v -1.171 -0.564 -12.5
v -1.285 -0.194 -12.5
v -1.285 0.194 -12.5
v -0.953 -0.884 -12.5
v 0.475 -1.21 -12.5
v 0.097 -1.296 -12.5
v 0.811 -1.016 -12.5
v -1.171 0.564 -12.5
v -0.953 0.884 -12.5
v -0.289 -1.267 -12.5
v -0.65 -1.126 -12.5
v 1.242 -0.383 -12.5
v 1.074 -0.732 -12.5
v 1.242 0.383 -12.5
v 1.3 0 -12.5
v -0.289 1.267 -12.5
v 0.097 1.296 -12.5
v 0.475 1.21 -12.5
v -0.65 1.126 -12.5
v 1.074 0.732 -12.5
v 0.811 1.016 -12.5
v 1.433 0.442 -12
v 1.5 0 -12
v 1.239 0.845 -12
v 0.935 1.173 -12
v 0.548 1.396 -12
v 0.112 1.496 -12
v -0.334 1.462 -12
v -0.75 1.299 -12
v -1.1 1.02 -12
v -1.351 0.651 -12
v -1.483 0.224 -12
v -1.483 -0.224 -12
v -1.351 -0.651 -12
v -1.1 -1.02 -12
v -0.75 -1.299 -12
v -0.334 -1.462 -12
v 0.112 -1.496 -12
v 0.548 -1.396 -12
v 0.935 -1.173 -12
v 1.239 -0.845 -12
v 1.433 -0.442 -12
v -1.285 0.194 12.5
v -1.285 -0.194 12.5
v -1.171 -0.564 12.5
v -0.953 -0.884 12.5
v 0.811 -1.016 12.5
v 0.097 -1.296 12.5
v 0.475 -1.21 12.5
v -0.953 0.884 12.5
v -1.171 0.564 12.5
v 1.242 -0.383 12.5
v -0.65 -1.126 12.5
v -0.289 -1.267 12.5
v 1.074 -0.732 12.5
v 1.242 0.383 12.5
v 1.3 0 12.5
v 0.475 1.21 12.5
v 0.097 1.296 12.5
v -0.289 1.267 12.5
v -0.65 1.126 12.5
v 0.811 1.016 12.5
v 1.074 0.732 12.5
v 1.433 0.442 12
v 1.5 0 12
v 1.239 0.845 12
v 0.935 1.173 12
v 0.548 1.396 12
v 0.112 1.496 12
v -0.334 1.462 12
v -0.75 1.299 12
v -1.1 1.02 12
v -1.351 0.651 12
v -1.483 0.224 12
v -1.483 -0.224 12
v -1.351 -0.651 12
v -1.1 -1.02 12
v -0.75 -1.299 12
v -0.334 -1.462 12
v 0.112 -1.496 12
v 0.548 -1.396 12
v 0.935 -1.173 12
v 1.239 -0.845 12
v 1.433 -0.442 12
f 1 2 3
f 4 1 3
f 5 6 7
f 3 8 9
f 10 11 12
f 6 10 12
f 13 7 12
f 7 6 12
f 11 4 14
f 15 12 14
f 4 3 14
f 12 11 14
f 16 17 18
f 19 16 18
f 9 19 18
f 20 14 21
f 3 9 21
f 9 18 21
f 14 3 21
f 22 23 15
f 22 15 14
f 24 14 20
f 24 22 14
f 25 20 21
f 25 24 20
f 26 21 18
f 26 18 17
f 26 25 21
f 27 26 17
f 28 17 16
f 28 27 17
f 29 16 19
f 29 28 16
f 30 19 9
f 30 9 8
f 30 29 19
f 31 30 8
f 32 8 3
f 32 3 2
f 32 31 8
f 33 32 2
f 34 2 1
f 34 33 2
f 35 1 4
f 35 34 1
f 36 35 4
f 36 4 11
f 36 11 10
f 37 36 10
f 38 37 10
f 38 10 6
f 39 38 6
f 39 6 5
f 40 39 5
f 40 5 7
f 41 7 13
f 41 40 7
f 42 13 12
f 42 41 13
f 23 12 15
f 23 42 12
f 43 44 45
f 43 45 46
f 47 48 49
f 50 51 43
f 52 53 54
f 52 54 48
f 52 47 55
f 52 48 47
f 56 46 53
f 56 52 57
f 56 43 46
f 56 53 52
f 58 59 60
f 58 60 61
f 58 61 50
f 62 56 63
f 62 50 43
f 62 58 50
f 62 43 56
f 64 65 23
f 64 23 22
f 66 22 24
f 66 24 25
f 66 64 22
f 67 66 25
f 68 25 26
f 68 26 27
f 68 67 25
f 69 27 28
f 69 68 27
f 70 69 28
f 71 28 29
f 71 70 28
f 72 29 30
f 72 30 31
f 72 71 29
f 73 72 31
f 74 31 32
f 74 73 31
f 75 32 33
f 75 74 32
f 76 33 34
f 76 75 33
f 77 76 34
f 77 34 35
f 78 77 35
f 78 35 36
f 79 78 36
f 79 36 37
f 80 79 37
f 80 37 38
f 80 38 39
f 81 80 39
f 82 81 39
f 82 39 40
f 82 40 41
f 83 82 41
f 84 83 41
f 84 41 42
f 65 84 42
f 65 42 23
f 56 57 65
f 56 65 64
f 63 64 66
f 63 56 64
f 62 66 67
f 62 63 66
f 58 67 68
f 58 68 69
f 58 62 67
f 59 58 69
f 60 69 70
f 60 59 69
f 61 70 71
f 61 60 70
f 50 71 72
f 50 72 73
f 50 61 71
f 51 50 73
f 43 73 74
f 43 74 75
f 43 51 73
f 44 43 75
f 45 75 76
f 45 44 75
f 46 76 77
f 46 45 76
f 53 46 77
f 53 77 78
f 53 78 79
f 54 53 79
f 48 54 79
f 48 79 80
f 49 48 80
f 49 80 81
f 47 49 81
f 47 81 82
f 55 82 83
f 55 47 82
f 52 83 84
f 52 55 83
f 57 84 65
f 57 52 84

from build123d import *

# Parameters (mm, degrees)
SKETCH1_R           = 1.5
BOSS_EXTRUDE1_DEPTH = 12.5
CHAMFER1_SIZE       = 0.5
CHAMFER1_SIZE2      = 0.2
CHAMFER2_SIZE       = 0.2
CHAMFER2_SIZE2      = 0.5


with BuildPart() as part:
    # Sketch1 → Boss-Extrude1 (new, symmetric)
    with BuildSketch(Plane.XY):
        Circle(SKETCH1_R)
    extrude(amount=BOSS_EXTRUDE1_DEPTH, both=True)

    # Chamfer1
    chamfer1_edges = [part.edges().sort_by_distance(p)[0] for p in [
        (-1.5, 0, 12.5),
    ]]
    chamfer1_side = [part.faces().sort_by_distance(p)[0] for p in [
        (-1.5, 0, 0),
    ]]
    chamfer(chamfer1_edges, length=CHAMFER1_SIZE, length2=CHAMFER1_SIZE2, reference=chamfer1_side[0])

    # Chamfer2
    chamfer2_edges = [part.edges().sort_by_distance(p)[0] for p in [
        (-1.5, 0, -12.5),
    ]]
    chamfer2_side = [part.faces().sort_by_distance(p)[0] for p in [
        (0, 0, -12.5),
    ]]
    chamfer(chamfer2_edges, length=CHAMFER2_SIZE, length2=CHAMFER2_SIZE2, reference=chamfer2_side[0])


solid = part.part
